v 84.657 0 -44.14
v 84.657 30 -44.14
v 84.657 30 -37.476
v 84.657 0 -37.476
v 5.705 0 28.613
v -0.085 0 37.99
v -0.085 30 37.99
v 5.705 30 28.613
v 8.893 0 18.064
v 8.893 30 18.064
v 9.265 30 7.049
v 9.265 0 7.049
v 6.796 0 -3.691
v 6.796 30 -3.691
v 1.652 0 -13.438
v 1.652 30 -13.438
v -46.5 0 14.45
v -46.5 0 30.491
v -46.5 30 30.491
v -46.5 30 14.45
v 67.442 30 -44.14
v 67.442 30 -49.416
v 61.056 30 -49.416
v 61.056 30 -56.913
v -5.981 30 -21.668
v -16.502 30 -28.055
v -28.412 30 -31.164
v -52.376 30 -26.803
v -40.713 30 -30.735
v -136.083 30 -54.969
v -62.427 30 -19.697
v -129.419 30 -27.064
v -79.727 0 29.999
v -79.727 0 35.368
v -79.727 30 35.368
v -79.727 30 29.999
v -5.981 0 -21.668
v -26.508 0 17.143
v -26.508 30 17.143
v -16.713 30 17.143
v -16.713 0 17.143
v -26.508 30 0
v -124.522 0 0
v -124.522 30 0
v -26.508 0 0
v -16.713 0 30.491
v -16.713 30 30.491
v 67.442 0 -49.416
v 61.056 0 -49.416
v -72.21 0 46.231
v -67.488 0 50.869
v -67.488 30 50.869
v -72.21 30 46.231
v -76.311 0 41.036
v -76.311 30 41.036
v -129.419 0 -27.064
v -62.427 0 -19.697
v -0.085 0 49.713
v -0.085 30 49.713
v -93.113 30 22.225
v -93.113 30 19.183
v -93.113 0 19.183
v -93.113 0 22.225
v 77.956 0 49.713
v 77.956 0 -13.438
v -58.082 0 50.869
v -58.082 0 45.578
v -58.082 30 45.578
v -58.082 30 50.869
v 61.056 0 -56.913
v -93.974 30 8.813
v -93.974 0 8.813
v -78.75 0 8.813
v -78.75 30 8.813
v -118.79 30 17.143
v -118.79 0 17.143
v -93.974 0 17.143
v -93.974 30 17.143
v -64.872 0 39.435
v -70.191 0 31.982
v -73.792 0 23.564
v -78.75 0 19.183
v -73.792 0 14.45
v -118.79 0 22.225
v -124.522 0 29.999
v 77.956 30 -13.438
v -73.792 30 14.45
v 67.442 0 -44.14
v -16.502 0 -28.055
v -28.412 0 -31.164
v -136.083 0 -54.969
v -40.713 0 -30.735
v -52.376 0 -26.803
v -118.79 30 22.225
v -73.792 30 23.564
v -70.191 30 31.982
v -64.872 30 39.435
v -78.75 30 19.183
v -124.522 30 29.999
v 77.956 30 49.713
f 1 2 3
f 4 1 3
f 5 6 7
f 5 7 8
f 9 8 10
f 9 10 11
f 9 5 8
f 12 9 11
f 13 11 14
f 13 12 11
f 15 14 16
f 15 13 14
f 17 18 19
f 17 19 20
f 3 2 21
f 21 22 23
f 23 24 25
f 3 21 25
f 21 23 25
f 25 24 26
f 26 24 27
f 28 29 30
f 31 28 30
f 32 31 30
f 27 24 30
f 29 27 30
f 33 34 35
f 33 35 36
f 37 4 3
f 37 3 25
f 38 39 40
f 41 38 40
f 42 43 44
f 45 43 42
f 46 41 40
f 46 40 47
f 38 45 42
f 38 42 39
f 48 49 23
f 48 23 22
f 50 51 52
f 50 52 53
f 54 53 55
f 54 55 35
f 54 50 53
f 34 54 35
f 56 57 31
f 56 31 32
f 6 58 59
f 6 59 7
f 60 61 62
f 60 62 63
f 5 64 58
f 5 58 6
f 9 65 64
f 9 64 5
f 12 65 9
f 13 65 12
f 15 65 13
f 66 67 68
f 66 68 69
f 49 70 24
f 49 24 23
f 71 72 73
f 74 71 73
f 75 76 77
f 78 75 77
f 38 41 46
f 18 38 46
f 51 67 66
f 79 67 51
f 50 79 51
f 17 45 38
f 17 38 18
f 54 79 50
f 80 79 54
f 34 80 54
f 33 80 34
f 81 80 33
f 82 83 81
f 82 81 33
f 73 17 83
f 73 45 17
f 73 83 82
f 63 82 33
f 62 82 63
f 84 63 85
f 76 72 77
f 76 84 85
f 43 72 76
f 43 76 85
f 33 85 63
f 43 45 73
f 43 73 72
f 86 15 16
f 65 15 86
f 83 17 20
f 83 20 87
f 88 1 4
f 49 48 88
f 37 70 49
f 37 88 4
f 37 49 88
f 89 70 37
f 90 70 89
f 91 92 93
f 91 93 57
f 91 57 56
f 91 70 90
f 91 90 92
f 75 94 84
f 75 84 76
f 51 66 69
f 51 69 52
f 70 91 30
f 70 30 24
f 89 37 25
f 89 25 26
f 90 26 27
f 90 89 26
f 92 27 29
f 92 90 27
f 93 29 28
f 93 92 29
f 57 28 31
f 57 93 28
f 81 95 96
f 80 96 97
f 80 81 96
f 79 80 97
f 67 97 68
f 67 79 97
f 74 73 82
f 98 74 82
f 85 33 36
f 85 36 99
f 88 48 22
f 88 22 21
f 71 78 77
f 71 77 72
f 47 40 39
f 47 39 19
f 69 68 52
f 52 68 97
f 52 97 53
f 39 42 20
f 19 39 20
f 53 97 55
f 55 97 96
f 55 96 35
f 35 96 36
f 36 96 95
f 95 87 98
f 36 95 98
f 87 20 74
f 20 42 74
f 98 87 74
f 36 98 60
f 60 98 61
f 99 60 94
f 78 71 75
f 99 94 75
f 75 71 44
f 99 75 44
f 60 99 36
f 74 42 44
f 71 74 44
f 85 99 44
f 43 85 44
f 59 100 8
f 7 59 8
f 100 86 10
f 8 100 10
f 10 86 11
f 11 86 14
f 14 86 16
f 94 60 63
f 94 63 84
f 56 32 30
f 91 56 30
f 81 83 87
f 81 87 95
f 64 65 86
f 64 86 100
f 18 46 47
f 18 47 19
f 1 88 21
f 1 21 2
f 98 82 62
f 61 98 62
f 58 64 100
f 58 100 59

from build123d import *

# Parameters (mm, degrees)
EXTRUDE_1_DEPTH   = 30
EXTRUDE_1_2_DEPTH = 30
EXTRUDE_1_3_DEPTH = 30


with BuildPart() as part:
    # 草图1 → 凸台-拉伸1 (new body)
    with BuildSketch(Plane(origin=(0, 0, 0), x_dir=(1, 0, 0), z_dir=(0, 1, 0))):
        with BuildLine():
            Line((-136.082892291, 54.969018568), (61.05573215, 56.912638809))
            Line((61.05573215, 56.912638809), (61.05573215, 49.41581788))
            Line((61.05573215, 49.41581788), (67.441912941, 49.41581788))
            Line((67.441912941, 49.41581788), (67.441912941, 44.140277226))
            Line((67.441912941, 44.140277226), (84.656835076, 44.140277226))
            Line((84.656835076, 44.140277226), (84.656835076, 37.4764364))
            Line((84.656835076, 37.4764364), (-5.980957684, 21.667519058))
            ThreePointArc((-5.980957684, 21.667519058), (-34.577933368, 31.396492976), (-62.426846885, 19.697007186))
            Line((-62.426846885, 19.697007186), (-129.419051465, 27.064185109))
            Line((-129.419051465, 27.064185109), (-136.082892291, 54.969018568))
        make_face()
    extrude(amount=EXTRUDE_1_DEPTH)


with BuildPart() as body_2:
    # 草图1 → Extrude 1 2 (new body)
    with BuildSketch(Plane(origin=(0, 0, 0), x_dir=(1, 0, 0), z_dir=(0, 1, 0))):
        with BuildLine():
            Line((-102.031983165, 0), (-26.508453802, 0))
            Line((-26.508453802, 0), (-26.508453802, -17.142864306))
            Line((-26.508453802, -17.142864306), (-16.713074962, -17.142864306))
            Line((-16.713074962, -17.142864306), (-16.713074962, -30.490830167))
            Line((-16.713074962, -30.490830167), (-46.49997628, -30.490830167))
            Line((-46.49997628, -30.490830167), (-46.49997628, -14.450076067))
            Line((-46.49997628, -14.450076067), (-73.791928581, -14.450076067))
            Line((-73.791928581, -14.450076067), (-73.791928581, -23.563516851))
            ThreePointArc((-73.791928581, -23.563516851), (-67.732334309, -35.851817062), (-58.082020963, -45.577682428))
            Line((-58.082020963, -45.577682428), (-58.082020963, -50.869114449))
            Line((-58.082020963, -50.869114449), (-67.488115693, -50.869114449))
            ThreePointArc((-67.488115693, -50.869114449), (-74.342116157, -43.698394408), (-79.726627066, -35.36751267))
            Line((-79.726627066, -35.36751267), (-79.726627066, -29.999037995))
            Line((-79.726627066, -29.999037995), (-102.031983165, -29.999037995))
            Line((-102.031983165, -29.999037995), (-124.522445953, -29.999037995))
            Line((-124.522445953, -29.999037995), (-124.522445953, 0))
            Line((-124.522445953, 0), (-102.031983165, 0))
        make_face()
        Polygon((-118.789920471, -17.142864306), (-93.974323171, -17.142864306), (-93.974323171, -8.812593797), (-78.750035691, -8.812593797), (-78.750035691, -19.183087669), (-93.11257105, -19.183087669), (-93.11257105, -22.224557031), (-118.789920471, -22.224557031), align=None, mode=Mode.SUBTRACT)
    extrude(amount=EXTRUDE_1_2_DEPTH)


with BuildPart() as body_3:
    # 草图1 → Extrude 1 3 (new body)
    with BuildSketch(Plane(origin=(0, 0, 0), x_dir=(1, 0, 0), z_dir=(0, 1, 0))):
        with BuildLine():
            Line((1.651741835, 13.437845981), (77.955850579, 13.437845981))
            Line((77.955850579, 13.437845981), (77.955850579, -49.712900439))
            Line((77.955850579, -49.712900439), (-0.084706025, -49.712900439))
            Line((-0.084706025, -49.712900439), (-0.084706025, -37.99037163))
            ThreePointArc((-0.084706025, -37.99037163), (9.437334696, -12.568454589), (1.651741835, 13.437845981))
        make_face()
    extrude(amount=EXTRUDE_1_3_DEPTH)


solid = Compound([part.part, body_2.part, body_3.part])
